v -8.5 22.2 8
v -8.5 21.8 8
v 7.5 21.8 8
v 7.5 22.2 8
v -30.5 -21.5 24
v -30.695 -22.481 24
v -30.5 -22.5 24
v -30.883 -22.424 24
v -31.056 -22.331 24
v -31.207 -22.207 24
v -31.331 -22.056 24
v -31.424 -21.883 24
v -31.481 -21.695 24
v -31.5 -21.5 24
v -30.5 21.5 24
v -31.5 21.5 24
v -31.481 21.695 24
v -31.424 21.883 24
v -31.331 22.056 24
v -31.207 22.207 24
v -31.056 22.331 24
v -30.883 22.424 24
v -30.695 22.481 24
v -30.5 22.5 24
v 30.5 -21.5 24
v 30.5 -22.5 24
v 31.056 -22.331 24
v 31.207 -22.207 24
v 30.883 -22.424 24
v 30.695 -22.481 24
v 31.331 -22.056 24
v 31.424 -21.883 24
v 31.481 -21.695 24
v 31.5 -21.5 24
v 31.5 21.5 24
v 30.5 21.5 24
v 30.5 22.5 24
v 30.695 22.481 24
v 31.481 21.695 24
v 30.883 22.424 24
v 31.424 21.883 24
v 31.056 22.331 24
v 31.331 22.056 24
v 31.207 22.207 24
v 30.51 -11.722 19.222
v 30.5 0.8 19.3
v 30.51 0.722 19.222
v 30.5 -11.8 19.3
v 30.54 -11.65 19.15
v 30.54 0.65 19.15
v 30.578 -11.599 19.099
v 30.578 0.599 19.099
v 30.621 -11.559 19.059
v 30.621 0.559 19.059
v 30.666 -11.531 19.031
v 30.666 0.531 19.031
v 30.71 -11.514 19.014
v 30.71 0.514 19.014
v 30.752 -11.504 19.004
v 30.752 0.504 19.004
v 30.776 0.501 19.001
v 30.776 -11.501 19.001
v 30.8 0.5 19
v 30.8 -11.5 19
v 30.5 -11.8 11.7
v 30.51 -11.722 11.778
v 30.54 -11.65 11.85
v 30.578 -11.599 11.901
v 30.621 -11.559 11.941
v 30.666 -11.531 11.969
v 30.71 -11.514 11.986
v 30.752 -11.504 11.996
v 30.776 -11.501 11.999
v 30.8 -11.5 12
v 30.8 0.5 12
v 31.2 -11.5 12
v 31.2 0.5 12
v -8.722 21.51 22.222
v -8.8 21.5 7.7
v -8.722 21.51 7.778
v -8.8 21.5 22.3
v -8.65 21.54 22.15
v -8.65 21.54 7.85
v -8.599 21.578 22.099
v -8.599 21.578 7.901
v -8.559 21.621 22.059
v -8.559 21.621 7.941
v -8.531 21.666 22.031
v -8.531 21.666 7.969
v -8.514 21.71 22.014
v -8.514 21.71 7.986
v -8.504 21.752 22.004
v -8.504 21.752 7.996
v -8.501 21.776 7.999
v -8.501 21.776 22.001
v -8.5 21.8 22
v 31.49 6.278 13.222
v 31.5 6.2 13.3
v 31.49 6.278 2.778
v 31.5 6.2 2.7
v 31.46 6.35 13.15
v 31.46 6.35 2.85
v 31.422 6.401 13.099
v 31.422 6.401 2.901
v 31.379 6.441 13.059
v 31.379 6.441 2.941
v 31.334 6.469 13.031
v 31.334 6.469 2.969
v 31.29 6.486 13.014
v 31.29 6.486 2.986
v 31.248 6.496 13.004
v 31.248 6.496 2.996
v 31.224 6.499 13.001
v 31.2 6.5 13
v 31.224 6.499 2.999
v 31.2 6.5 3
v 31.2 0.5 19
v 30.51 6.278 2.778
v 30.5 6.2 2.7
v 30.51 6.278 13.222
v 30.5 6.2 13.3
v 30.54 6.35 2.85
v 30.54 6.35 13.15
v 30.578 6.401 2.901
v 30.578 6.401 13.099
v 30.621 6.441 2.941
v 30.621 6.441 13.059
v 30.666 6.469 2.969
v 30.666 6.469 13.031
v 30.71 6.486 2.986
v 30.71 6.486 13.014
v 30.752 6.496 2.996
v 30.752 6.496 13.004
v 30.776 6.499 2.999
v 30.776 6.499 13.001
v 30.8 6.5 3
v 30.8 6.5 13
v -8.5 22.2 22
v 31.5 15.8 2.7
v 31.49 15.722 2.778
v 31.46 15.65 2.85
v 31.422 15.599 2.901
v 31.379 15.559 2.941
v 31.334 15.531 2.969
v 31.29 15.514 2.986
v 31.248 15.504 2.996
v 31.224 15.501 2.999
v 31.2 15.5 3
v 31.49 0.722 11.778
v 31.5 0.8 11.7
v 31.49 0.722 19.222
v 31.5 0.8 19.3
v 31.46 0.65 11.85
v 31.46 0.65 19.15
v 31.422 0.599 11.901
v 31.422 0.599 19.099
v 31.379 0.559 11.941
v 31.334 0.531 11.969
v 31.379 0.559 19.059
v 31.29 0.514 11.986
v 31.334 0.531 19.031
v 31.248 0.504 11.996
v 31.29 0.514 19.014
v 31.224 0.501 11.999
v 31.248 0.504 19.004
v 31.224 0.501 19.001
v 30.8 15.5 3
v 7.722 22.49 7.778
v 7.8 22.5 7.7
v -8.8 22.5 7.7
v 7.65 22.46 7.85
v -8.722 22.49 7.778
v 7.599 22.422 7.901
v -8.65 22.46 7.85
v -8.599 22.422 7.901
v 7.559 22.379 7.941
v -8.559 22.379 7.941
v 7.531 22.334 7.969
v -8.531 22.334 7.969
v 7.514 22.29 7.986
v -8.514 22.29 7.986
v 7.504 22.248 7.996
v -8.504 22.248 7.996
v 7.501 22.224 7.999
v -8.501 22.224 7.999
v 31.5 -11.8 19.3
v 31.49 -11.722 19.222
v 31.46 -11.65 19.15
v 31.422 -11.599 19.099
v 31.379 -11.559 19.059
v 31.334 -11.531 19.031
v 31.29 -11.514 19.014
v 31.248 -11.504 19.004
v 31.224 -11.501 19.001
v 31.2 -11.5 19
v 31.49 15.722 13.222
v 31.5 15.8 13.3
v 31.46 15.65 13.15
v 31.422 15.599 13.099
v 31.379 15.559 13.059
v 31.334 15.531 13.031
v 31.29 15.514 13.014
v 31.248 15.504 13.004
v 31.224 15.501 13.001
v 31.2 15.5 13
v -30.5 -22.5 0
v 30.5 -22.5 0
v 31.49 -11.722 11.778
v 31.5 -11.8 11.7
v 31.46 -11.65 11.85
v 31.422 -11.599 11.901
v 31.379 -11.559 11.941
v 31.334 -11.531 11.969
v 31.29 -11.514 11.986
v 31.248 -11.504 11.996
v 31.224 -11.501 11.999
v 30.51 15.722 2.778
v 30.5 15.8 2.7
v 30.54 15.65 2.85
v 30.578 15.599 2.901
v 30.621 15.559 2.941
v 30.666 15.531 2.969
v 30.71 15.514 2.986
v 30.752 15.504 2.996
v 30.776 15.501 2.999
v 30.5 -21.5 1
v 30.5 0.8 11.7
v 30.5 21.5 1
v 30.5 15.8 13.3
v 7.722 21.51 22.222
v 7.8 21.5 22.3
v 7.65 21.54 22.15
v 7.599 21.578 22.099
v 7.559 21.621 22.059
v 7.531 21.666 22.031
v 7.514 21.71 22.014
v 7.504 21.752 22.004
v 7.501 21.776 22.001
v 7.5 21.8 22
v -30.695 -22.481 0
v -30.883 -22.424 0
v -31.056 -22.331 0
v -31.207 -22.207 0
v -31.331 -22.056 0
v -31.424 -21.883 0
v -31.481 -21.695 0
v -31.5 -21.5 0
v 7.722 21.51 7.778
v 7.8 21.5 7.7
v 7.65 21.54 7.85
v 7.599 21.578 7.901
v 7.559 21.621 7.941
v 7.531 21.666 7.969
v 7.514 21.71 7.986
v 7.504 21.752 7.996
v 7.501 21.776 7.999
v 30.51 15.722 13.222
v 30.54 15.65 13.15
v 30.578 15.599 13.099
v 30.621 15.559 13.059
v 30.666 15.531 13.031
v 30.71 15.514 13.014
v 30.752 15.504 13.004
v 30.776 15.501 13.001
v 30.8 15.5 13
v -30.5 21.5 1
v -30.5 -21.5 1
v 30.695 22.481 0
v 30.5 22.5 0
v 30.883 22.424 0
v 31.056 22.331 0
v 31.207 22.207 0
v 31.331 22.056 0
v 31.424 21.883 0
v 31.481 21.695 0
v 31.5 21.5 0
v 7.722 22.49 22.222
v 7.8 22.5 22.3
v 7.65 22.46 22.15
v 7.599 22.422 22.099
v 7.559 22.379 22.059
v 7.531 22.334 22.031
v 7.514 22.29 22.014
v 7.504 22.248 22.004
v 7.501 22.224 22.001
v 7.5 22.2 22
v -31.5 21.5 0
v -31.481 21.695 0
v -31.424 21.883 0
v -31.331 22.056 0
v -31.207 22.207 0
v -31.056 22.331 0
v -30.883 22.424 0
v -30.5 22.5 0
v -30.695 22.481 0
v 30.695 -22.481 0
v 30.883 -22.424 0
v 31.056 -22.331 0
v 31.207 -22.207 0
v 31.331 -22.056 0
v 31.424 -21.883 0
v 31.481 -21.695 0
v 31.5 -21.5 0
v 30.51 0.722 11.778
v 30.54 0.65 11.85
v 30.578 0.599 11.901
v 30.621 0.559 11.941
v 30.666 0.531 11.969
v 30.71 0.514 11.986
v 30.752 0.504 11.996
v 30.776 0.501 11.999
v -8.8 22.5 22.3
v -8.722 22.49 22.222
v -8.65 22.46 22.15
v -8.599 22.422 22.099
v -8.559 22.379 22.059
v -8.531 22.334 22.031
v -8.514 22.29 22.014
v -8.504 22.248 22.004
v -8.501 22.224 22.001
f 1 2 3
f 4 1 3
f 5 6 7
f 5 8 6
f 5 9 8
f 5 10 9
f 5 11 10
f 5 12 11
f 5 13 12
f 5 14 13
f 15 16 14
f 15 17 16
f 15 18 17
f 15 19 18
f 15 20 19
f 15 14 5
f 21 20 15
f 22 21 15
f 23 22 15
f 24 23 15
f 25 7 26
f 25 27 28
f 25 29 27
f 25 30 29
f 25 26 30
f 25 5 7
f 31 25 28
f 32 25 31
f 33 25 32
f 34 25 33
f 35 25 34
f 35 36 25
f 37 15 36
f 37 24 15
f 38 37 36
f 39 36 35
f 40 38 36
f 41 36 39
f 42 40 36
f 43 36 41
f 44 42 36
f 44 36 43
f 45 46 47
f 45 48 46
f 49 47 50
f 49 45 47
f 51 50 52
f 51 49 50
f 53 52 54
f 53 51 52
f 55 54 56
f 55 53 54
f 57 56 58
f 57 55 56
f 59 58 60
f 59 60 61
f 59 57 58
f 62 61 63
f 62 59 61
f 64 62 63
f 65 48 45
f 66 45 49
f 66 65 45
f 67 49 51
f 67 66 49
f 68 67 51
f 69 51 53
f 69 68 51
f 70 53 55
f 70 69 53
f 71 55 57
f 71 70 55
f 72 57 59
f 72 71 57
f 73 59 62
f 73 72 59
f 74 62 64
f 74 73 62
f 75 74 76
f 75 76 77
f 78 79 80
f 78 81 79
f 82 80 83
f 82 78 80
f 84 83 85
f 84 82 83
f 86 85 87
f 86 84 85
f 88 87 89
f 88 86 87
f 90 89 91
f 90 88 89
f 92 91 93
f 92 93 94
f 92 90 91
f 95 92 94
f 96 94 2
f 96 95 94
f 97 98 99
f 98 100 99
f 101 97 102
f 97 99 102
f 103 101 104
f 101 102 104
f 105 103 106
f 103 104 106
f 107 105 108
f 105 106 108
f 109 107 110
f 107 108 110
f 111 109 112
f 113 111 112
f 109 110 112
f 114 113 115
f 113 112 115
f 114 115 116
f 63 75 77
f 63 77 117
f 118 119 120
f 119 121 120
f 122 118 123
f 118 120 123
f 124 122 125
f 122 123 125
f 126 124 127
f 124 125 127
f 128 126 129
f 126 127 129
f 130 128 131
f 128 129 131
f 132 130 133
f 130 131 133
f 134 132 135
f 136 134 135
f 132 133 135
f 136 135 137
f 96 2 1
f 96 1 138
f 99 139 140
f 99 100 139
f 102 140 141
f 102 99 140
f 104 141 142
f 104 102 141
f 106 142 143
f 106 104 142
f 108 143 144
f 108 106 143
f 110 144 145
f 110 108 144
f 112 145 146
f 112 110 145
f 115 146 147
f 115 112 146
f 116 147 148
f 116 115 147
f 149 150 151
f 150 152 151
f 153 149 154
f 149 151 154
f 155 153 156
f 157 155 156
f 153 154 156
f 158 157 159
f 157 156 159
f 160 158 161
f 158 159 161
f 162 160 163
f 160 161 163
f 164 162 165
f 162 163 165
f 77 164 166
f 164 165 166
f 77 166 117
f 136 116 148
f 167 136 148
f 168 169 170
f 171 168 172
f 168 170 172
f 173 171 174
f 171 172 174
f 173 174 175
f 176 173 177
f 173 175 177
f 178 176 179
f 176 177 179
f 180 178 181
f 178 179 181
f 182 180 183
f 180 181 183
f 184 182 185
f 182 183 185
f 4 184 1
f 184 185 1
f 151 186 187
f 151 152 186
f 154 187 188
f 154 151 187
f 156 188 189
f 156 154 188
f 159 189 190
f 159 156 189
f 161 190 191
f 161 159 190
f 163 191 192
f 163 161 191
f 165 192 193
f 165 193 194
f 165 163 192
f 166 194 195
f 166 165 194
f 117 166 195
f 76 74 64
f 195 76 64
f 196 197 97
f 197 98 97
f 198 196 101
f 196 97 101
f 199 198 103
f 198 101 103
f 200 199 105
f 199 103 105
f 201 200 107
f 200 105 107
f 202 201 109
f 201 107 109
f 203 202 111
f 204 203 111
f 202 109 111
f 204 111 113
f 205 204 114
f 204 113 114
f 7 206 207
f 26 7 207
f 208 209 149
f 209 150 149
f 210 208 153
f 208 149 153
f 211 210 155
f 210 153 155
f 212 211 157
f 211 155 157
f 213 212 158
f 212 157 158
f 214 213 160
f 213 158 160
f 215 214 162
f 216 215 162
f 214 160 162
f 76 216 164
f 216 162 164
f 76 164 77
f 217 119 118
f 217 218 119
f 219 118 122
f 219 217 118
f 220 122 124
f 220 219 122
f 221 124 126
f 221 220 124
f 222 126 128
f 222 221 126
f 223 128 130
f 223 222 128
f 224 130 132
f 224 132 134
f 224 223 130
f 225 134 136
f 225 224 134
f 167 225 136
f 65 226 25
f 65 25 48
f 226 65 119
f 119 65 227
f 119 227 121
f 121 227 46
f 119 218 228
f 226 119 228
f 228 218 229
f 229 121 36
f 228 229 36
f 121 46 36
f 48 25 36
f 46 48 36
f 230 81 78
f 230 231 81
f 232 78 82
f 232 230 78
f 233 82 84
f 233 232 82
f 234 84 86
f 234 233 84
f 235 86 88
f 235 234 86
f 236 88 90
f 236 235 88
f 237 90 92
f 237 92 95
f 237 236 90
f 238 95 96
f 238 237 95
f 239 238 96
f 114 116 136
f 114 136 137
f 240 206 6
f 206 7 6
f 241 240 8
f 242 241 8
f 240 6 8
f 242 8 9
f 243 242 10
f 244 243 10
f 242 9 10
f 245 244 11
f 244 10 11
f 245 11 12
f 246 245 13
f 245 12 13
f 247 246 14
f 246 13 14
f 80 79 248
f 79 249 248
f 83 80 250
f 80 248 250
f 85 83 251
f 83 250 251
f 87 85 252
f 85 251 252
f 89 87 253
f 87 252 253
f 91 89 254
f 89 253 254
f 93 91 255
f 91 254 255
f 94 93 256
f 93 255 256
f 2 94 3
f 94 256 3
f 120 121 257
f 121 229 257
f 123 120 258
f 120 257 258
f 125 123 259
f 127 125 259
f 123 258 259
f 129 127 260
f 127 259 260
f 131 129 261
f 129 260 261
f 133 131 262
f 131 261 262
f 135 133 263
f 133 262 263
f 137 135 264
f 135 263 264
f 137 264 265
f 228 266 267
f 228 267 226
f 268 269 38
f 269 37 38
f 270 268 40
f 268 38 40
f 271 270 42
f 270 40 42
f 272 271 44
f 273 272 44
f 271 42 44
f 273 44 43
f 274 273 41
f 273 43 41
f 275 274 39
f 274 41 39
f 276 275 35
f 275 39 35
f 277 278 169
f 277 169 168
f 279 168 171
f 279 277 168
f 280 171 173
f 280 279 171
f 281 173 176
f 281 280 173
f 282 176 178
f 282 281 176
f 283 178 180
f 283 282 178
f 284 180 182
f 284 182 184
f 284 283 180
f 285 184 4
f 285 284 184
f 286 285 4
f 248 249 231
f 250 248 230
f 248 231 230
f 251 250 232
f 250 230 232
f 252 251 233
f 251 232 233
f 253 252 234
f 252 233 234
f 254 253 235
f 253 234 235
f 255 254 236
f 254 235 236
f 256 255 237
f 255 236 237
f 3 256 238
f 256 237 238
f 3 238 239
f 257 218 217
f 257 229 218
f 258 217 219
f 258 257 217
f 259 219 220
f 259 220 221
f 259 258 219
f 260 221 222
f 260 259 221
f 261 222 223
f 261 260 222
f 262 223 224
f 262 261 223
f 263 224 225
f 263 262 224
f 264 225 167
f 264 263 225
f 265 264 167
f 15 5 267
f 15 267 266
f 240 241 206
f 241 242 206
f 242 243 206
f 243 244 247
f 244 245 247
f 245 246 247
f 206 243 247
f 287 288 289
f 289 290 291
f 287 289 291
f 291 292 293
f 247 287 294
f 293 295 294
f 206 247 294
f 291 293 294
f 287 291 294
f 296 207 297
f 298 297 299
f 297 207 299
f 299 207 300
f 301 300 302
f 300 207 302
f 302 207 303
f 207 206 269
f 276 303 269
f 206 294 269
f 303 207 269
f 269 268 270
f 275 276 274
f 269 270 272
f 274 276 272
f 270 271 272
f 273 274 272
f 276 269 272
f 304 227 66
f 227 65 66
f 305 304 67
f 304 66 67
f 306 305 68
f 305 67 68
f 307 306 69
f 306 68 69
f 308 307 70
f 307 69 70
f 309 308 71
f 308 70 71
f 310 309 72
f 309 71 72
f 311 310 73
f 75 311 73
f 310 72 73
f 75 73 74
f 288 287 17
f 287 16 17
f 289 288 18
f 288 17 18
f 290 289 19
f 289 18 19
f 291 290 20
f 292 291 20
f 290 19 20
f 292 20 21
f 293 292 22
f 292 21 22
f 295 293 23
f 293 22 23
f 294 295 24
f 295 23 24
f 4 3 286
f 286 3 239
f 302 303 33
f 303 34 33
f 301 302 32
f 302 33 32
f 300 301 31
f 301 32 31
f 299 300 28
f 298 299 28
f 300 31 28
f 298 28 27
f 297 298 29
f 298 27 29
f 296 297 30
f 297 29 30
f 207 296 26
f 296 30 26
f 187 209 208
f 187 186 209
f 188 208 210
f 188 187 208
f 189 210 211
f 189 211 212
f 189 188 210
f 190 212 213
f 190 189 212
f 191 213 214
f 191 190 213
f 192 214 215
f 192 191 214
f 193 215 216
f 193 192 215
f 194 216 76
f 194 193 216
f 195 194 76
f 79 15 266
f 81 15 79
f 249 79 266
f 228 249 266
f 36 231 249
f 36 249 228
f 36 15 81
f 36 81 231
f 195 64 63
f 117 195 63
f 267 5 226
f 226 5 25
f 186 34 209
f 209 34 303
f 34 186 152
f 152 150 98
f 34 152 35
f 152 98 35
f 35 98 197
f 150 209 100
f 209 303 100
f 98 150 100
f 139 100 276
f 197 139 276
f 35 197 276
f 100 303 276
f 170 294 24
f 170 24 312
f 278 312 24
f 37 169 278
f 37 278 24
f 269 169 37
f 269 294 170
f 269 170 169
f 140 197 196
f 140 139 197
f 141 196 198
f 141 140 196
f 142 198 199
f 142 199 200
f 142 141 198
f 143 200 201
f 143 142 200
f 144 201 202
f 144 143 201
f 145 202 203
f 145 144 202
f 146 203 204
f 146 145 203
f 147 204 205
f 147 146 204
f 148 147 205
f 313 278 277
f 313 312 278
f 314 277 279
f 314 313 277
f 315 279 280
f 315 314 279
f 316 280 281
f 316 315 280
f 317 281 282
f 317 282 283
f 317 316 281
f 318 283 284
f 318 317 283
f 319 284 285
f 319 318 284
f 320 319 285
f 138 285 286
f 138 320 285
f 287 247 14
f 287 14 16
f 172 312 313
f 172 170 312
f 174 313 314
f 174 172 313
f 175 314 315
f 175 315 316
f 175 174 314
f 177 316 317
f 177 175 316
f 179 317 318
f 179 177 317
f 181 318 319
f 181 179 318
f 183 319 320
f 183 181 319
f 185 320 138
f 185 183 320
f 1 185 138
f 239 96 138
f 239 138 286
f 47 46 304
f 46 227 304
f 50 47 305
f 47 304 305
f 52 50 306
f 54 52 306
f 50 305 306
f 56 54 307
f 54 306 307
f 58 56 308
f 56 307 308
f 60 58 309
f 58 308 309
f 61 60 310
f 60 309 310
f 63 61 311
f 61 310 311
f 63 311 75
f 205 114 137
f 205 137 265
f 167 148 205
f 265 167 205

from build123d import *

# Parameters (mm, degrees)
SKETCH_W        = 63
SKETCH_H        = 45
PAD_DEPTH       = 24
SKETCH001_W     = 61
SKETCH001_H     = 43
POCKET_DEPTH    = 23
SKETCH002_W     = 12
SKETCH002_H     = 7
SKETCH002_W_2   = 9
SKETCH002_H_2   = 10
POCKET001_DEPTH = 2.5
SKETCH003_W     = 16
SKETCH003_H     = 14
POCKET002_DEPTH = 2.5
FILLET_R        = 1
FILLET001_R     = 1
FILLET002_R     = 1
FILLET003_R     = 1
FILLET004_R     = 0.3
FILLET005_R     = 0.3
FILLET006_R     = 0.3
FILLET007_R     = 0.3
FILLET008_R     = 0.3
FILLET009_R     = 0.3


with BuildPart() as part:
    # Sketch → Pad (new body)
    with BuildSketch(Plane.XY):
        Rectangle(SKETCH_W, SKETCH_H)
    extrude(amount=PAD_DEPTH)

    # Sketch001 → Pocket (cut)
    with BuildSketch(Plane.XY.offset(24)):
        Rectangle(SKETCH001_W, SKETCH001_H)
    extrude(amount=-POCKET_DEPTH, mode=Mode.SUBTRACT)

    # Sketch002 → Pocket001 (cut, symmetric)
    with BuildSketch(Plane.YZ.offset(30)):
        with Locations((-5.5, 15.5)):
            Rectangle(SKETCH002_W, SKETCH002_H)
        with Locations((11, 8)):
            Rectangle(SKETCH002_W_2, SKETCH002_H_2)
    extrude(amount=POCKET001_DEPTH, both=True, mode=Mode.SUBTRACT)

    # Sketch003 → Pocket002 (cut, symmetric)
    with BuildSketch(Plane.XZ.offset(-23)):
        with Locations((-0.5, 15)):
            Rectangle(SKETCH003_W, SKETCH003_H)
    extrude(amount=POCKET002_DEPTH, both=True, mode=Mode.SUBTRACT)

    # Fillet
    fillet_edges = [part.edges().sort_by_distance(p)[0] for p in [
        (31.5, 22.5, 12),
    ]]
    fillet(fillet_edges, radius=FILLET_R)

    # Fillet001
    fillet001_edges = [part.edges().sort_by_distance(p)[0] for p in [
        (31.5, -22.5, 12),
    ]]
    fillet(fillet001_edges, radius=FILLET001_R)

    # Fillet002
    fillet002_edges = [part.edges().sort_by_distance(p)[0] for p in [
        (-31.5, -22.5, 12),
    ]]
    fillet(fillet002_edges, radius=FILLET002_R)

    # Fillet003
    fillet003_edges = [part.edges().sort_by_distance(p)[0] for p in [
        (-31.5, 22.5, 12),
    ]]
    fillet(fillet003_edges, radius=FILLET003_R)

    # Fillet004
    fillet004_edges = [part.edges().sort_by_distance(p)[0] for p in [
        (-0.5, 22.5, 8),
    ]]
    fillet(fillet004_edges, radius=FILLET004_R)

    # Fillet005
    fillet005_edges = [part.edges().sort_by_distance(p)[0] for p in [
        (7.5, 22.5, 15),
        (-8.5, 22.5, 15),
    ]]
    fillet(fillet005_edges, radius=FILLET005_R)

    # Fillet006
    fillet006_edges = [part.edges().sort_by_distance(p)[0] for p in [
        (-0.5, 22.5, 22),
    ]]
    fillet(fillet006_edges, radius=FILLET006_R)

    # Fillet007
    fillet007_edges = [part.edges().sort_by_distance(p)[0] for p in [
        (31.5, 11, 3),
        (31.5, 6.5, 8),
        (31.5, 11, 13),
        (31.5, 15.5, 8),
        (31.5, -5.5, 12),
        (31.5, 0.5, 15.5),
        (31.5, -5.5, 19),
        (31.5, -11.5, 15.5),
    ]]
    fillet(fillet007_edges, radius=FILLET007_R)

    # Fillet008
    fillet008_edges = [part.edges().sort_by_distance(p)[0] for p in [
        (-0.5, 21.5, 22),
        (-0.5, 21.5, 8),
        (-8.5, 21.5, 15),
        (7.5, 21.5, 15),
    ]]
    fillet(fillet008_edges, radius=FILLET008_R)

    # Fillet009
    fillet009_edges = [part.edges().sort_by_distance(p)[0] for p in [
        (30.5, 11, 3),
        (30.5, 6.5, 8),
        (30.5, 11, 13),
        (30.5, 15.5, 8),
        (30.5, -5.5, 12),
        (30.5, -11.5, 15.5),
        (30.5, -5.5, 19),
        (30.5, 0.5, 15.5),
    ]]
    fillet(fillet009_edges, radius=FILLET009_R)


solid = part.part
